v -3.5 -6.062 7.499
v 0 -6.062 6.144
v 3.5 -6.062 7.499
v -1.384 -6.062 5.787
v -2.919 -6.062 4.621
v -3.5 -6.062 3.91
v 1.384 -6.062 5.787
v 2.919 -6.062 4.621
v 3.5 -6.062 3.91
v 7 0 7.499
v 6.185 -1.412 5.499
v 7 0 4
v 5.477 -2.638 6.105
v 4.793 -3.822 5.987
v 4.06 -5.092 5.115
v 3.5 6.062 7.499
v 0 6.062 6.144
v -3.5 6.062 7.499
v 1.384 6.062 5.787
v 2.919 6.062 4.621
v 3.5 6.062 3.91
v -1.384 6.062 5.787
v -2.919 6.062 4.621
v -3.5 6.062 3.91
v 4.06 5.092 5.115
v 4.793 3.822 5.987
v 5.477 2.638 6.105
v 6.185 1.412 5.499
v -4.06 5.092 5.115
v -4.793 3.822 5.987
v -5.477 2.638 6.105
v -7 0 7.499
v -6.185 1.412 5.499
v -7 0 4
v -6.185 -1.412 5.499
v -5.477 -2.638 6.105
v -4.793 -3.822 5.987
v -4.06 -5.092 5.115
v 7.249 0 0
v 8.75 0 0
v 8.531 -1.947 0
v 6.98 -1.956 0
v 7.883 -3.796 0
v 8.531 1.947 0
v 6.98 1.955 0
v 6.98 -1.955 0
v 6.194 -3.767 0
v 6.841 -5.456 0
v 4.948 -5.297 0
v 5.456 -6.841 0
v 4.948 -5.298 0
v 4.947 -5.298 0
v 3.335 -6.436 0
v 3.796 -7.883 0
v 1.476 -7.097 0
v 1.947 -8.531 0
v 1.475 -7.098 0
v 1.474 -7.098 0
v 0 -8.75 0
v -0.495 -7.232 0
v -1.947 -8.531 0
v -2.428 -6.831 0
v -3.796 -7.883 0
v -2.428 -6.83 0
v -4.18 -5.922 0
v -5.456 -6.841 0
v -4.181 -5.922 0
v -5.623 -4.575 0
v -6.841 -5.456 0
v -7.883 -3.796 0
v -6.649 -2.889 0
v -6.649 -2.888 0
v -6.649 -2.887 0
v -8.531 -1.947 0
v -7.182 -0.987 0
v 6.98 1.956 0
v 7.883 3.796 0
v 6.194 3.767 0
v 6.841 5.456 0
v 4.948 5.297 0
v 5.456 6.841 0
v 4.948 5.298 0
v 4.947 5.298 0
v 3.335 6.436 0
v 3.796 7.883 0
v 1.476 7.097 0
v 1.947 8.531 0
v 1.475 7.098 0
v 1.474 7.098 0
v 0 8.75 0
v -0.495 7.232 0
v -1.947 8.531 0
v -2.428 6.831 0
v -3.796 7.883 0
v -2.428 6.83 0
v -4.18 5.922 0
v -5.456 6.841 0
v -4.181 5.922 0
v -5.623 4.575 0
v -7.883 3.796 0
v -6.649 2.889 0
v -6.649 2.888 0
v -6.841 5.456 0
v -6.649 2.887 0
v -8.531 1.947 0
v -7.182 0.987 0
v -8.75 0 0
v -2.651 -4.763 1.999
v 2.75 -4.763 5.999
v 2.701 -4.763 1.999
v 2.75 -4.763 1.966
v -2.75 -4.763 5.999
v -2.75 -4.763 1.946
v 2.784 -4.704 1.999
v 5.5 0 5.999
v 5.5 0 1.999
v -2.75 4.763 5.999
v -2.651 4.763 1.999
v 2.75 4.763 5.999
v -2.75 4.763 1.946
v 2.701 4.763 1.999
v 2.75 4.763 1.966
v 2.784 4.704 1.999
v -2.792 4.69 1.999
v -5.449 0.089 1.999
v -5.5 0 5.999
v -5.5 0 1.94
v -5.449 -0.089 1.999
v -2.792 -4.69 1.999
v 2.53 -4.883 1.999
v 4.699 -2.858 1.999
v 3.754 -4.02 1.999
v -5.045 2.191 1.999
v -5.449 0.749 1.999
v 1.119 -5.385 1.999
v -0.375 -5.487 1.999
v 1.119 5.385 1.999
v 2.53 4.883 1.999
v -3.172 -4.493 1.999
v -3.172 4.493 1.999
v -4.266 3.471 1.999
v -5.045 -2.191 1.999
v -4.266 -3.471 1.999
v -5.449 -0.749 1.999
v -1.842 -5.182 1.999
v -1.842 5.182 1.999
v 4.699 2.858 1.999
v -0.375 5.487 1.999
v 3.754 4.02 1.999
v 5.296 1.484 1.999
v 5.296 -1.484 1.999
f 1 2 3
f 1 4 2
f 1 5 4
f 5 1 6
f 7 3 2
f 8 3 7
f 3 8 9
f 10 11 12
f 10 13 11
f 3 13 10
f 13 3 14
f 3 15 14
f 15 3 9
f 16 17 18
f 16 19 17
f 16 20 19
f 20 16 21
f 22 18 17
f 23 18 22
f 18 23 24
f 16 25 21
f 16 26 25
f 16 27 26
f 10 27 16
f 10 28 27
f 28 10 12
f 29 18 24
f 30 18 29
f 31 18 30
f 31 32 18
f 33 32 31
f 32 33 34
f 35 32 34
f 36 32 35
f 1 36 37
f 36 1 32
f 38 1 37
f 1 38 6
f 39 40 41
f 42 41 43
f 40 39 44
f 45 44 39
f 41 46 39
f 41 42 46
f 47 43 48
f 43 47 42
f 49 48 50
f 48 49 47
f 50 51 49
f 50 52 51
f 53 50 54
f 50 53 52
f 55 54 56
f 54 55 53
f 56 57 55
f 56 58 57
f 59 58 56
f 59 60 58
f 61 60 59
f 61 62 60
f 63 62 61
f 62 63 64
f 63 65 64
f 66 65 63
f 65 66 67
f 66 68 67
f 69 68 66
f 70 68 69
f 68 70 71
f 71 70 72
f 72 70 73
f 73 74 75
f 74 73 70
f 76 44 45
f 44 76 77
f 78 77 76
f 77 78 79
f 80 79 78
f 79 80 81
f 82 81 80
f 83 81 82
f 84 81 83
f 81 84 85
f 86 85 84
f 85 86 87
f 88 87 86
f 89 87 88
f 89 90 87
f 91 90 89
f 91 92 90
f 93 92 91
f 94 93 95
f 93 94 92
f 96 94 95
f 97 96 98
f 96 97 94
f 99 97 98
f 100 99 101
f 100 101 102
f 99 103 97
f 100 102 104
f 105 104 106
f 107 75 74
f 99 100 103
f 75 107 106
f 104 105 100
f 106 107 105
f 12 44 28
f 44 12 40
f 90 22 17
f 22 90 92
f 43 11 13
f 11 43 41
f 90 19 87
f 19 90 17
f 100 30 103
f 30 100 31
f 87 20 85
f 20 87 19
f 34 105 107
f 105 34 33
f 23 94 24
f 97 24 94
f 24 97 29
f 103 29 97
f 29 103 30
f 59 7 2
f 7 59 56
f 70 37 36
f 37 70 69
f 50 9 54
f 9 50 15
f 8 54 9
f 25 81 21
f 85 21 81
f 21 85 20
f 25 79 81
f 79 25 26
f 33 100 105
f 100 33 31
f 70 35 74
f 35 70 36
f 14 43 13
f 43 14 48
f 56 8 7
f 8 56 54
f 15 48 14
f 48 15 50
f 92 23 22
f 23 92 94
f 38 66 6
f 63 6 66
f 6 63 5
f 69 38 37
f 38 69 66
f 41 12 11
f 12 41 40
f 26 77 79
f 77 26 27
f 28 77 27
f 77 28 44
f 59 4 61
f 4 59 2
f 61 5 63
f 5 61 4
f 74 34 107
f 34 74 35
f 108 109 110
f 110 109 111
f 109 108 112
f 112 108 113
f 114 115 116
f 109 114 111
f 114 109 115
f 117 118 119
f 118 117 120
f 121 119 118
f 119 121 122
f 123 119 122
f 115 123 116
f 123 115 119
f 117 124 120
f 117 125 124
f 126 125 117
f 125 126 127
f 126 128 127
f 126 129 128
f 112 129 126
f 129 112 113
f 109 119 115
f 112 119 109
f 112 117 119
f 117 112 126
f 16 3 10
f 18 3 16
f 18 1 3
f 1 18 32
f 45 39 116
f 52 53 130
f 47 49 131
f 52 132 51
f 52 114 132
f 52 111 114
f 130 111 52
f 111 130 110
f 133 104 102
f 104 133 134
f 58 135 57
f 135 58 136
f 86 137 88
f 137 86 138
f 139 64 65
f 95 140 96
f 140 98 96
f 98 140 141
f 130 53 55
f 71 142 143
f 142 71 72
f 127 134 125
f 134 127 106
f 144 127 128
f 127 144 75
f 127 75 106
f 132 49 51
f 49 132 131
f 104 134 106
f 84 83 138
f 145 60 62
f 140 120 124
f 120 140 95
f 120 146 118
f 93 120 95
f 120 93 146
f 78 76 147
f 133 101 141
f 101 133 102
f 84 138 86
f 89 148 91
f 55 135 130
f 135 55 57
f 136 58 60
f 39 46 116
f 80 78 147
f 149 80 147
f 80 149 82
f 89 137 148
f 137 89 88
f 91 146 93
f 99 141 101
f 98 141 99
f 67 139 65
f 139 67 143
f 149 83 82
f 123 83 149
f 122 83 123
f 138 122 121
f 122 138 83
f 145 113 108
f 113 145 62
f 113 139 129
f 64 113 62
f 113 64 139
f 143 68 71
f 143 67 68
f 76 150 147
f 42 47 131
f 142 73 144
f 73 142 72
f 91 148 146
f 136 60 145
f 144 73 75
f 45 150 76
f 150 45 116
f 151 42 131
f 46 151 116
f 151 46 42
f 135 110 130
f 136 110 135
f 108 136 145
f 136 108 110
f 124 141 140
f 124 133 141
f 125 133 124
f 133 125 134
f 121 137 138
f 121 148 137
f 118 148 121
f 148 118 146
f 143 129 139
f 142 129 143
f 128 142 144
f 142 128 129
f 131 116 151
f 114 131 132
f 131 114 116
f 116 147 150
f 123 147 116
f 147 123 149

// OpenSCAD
// shell width
shell=1.5;

// diameter of nut
nut_d=11;

// nut height
nut_h=6;

// flange diam
fl_d=14.5;

// flange height
fl_h=2;

// outside offset of flange
fl_od=(fl_d-nut_d)/2;
echo(fl_od);

difference() {
    union() {
        cylinder(d=nut_d+2*shell,h=nut_h+shell, $fn=6);
        cylinder(d1=fl_d+2*shell,d2=0,h=(fl_d+2*shell)*fl_h/fl_od);
    }
    translate([0,0,-.001]) {
        cylinder(d=nut_d,h=nut_h, $fn=6);
        translate([-50,-50,nut_h+shell]) cube([100,100,100]);
        cylinder(d2=nut_d,d1=fl_d,h=fl_h);
    }
}
